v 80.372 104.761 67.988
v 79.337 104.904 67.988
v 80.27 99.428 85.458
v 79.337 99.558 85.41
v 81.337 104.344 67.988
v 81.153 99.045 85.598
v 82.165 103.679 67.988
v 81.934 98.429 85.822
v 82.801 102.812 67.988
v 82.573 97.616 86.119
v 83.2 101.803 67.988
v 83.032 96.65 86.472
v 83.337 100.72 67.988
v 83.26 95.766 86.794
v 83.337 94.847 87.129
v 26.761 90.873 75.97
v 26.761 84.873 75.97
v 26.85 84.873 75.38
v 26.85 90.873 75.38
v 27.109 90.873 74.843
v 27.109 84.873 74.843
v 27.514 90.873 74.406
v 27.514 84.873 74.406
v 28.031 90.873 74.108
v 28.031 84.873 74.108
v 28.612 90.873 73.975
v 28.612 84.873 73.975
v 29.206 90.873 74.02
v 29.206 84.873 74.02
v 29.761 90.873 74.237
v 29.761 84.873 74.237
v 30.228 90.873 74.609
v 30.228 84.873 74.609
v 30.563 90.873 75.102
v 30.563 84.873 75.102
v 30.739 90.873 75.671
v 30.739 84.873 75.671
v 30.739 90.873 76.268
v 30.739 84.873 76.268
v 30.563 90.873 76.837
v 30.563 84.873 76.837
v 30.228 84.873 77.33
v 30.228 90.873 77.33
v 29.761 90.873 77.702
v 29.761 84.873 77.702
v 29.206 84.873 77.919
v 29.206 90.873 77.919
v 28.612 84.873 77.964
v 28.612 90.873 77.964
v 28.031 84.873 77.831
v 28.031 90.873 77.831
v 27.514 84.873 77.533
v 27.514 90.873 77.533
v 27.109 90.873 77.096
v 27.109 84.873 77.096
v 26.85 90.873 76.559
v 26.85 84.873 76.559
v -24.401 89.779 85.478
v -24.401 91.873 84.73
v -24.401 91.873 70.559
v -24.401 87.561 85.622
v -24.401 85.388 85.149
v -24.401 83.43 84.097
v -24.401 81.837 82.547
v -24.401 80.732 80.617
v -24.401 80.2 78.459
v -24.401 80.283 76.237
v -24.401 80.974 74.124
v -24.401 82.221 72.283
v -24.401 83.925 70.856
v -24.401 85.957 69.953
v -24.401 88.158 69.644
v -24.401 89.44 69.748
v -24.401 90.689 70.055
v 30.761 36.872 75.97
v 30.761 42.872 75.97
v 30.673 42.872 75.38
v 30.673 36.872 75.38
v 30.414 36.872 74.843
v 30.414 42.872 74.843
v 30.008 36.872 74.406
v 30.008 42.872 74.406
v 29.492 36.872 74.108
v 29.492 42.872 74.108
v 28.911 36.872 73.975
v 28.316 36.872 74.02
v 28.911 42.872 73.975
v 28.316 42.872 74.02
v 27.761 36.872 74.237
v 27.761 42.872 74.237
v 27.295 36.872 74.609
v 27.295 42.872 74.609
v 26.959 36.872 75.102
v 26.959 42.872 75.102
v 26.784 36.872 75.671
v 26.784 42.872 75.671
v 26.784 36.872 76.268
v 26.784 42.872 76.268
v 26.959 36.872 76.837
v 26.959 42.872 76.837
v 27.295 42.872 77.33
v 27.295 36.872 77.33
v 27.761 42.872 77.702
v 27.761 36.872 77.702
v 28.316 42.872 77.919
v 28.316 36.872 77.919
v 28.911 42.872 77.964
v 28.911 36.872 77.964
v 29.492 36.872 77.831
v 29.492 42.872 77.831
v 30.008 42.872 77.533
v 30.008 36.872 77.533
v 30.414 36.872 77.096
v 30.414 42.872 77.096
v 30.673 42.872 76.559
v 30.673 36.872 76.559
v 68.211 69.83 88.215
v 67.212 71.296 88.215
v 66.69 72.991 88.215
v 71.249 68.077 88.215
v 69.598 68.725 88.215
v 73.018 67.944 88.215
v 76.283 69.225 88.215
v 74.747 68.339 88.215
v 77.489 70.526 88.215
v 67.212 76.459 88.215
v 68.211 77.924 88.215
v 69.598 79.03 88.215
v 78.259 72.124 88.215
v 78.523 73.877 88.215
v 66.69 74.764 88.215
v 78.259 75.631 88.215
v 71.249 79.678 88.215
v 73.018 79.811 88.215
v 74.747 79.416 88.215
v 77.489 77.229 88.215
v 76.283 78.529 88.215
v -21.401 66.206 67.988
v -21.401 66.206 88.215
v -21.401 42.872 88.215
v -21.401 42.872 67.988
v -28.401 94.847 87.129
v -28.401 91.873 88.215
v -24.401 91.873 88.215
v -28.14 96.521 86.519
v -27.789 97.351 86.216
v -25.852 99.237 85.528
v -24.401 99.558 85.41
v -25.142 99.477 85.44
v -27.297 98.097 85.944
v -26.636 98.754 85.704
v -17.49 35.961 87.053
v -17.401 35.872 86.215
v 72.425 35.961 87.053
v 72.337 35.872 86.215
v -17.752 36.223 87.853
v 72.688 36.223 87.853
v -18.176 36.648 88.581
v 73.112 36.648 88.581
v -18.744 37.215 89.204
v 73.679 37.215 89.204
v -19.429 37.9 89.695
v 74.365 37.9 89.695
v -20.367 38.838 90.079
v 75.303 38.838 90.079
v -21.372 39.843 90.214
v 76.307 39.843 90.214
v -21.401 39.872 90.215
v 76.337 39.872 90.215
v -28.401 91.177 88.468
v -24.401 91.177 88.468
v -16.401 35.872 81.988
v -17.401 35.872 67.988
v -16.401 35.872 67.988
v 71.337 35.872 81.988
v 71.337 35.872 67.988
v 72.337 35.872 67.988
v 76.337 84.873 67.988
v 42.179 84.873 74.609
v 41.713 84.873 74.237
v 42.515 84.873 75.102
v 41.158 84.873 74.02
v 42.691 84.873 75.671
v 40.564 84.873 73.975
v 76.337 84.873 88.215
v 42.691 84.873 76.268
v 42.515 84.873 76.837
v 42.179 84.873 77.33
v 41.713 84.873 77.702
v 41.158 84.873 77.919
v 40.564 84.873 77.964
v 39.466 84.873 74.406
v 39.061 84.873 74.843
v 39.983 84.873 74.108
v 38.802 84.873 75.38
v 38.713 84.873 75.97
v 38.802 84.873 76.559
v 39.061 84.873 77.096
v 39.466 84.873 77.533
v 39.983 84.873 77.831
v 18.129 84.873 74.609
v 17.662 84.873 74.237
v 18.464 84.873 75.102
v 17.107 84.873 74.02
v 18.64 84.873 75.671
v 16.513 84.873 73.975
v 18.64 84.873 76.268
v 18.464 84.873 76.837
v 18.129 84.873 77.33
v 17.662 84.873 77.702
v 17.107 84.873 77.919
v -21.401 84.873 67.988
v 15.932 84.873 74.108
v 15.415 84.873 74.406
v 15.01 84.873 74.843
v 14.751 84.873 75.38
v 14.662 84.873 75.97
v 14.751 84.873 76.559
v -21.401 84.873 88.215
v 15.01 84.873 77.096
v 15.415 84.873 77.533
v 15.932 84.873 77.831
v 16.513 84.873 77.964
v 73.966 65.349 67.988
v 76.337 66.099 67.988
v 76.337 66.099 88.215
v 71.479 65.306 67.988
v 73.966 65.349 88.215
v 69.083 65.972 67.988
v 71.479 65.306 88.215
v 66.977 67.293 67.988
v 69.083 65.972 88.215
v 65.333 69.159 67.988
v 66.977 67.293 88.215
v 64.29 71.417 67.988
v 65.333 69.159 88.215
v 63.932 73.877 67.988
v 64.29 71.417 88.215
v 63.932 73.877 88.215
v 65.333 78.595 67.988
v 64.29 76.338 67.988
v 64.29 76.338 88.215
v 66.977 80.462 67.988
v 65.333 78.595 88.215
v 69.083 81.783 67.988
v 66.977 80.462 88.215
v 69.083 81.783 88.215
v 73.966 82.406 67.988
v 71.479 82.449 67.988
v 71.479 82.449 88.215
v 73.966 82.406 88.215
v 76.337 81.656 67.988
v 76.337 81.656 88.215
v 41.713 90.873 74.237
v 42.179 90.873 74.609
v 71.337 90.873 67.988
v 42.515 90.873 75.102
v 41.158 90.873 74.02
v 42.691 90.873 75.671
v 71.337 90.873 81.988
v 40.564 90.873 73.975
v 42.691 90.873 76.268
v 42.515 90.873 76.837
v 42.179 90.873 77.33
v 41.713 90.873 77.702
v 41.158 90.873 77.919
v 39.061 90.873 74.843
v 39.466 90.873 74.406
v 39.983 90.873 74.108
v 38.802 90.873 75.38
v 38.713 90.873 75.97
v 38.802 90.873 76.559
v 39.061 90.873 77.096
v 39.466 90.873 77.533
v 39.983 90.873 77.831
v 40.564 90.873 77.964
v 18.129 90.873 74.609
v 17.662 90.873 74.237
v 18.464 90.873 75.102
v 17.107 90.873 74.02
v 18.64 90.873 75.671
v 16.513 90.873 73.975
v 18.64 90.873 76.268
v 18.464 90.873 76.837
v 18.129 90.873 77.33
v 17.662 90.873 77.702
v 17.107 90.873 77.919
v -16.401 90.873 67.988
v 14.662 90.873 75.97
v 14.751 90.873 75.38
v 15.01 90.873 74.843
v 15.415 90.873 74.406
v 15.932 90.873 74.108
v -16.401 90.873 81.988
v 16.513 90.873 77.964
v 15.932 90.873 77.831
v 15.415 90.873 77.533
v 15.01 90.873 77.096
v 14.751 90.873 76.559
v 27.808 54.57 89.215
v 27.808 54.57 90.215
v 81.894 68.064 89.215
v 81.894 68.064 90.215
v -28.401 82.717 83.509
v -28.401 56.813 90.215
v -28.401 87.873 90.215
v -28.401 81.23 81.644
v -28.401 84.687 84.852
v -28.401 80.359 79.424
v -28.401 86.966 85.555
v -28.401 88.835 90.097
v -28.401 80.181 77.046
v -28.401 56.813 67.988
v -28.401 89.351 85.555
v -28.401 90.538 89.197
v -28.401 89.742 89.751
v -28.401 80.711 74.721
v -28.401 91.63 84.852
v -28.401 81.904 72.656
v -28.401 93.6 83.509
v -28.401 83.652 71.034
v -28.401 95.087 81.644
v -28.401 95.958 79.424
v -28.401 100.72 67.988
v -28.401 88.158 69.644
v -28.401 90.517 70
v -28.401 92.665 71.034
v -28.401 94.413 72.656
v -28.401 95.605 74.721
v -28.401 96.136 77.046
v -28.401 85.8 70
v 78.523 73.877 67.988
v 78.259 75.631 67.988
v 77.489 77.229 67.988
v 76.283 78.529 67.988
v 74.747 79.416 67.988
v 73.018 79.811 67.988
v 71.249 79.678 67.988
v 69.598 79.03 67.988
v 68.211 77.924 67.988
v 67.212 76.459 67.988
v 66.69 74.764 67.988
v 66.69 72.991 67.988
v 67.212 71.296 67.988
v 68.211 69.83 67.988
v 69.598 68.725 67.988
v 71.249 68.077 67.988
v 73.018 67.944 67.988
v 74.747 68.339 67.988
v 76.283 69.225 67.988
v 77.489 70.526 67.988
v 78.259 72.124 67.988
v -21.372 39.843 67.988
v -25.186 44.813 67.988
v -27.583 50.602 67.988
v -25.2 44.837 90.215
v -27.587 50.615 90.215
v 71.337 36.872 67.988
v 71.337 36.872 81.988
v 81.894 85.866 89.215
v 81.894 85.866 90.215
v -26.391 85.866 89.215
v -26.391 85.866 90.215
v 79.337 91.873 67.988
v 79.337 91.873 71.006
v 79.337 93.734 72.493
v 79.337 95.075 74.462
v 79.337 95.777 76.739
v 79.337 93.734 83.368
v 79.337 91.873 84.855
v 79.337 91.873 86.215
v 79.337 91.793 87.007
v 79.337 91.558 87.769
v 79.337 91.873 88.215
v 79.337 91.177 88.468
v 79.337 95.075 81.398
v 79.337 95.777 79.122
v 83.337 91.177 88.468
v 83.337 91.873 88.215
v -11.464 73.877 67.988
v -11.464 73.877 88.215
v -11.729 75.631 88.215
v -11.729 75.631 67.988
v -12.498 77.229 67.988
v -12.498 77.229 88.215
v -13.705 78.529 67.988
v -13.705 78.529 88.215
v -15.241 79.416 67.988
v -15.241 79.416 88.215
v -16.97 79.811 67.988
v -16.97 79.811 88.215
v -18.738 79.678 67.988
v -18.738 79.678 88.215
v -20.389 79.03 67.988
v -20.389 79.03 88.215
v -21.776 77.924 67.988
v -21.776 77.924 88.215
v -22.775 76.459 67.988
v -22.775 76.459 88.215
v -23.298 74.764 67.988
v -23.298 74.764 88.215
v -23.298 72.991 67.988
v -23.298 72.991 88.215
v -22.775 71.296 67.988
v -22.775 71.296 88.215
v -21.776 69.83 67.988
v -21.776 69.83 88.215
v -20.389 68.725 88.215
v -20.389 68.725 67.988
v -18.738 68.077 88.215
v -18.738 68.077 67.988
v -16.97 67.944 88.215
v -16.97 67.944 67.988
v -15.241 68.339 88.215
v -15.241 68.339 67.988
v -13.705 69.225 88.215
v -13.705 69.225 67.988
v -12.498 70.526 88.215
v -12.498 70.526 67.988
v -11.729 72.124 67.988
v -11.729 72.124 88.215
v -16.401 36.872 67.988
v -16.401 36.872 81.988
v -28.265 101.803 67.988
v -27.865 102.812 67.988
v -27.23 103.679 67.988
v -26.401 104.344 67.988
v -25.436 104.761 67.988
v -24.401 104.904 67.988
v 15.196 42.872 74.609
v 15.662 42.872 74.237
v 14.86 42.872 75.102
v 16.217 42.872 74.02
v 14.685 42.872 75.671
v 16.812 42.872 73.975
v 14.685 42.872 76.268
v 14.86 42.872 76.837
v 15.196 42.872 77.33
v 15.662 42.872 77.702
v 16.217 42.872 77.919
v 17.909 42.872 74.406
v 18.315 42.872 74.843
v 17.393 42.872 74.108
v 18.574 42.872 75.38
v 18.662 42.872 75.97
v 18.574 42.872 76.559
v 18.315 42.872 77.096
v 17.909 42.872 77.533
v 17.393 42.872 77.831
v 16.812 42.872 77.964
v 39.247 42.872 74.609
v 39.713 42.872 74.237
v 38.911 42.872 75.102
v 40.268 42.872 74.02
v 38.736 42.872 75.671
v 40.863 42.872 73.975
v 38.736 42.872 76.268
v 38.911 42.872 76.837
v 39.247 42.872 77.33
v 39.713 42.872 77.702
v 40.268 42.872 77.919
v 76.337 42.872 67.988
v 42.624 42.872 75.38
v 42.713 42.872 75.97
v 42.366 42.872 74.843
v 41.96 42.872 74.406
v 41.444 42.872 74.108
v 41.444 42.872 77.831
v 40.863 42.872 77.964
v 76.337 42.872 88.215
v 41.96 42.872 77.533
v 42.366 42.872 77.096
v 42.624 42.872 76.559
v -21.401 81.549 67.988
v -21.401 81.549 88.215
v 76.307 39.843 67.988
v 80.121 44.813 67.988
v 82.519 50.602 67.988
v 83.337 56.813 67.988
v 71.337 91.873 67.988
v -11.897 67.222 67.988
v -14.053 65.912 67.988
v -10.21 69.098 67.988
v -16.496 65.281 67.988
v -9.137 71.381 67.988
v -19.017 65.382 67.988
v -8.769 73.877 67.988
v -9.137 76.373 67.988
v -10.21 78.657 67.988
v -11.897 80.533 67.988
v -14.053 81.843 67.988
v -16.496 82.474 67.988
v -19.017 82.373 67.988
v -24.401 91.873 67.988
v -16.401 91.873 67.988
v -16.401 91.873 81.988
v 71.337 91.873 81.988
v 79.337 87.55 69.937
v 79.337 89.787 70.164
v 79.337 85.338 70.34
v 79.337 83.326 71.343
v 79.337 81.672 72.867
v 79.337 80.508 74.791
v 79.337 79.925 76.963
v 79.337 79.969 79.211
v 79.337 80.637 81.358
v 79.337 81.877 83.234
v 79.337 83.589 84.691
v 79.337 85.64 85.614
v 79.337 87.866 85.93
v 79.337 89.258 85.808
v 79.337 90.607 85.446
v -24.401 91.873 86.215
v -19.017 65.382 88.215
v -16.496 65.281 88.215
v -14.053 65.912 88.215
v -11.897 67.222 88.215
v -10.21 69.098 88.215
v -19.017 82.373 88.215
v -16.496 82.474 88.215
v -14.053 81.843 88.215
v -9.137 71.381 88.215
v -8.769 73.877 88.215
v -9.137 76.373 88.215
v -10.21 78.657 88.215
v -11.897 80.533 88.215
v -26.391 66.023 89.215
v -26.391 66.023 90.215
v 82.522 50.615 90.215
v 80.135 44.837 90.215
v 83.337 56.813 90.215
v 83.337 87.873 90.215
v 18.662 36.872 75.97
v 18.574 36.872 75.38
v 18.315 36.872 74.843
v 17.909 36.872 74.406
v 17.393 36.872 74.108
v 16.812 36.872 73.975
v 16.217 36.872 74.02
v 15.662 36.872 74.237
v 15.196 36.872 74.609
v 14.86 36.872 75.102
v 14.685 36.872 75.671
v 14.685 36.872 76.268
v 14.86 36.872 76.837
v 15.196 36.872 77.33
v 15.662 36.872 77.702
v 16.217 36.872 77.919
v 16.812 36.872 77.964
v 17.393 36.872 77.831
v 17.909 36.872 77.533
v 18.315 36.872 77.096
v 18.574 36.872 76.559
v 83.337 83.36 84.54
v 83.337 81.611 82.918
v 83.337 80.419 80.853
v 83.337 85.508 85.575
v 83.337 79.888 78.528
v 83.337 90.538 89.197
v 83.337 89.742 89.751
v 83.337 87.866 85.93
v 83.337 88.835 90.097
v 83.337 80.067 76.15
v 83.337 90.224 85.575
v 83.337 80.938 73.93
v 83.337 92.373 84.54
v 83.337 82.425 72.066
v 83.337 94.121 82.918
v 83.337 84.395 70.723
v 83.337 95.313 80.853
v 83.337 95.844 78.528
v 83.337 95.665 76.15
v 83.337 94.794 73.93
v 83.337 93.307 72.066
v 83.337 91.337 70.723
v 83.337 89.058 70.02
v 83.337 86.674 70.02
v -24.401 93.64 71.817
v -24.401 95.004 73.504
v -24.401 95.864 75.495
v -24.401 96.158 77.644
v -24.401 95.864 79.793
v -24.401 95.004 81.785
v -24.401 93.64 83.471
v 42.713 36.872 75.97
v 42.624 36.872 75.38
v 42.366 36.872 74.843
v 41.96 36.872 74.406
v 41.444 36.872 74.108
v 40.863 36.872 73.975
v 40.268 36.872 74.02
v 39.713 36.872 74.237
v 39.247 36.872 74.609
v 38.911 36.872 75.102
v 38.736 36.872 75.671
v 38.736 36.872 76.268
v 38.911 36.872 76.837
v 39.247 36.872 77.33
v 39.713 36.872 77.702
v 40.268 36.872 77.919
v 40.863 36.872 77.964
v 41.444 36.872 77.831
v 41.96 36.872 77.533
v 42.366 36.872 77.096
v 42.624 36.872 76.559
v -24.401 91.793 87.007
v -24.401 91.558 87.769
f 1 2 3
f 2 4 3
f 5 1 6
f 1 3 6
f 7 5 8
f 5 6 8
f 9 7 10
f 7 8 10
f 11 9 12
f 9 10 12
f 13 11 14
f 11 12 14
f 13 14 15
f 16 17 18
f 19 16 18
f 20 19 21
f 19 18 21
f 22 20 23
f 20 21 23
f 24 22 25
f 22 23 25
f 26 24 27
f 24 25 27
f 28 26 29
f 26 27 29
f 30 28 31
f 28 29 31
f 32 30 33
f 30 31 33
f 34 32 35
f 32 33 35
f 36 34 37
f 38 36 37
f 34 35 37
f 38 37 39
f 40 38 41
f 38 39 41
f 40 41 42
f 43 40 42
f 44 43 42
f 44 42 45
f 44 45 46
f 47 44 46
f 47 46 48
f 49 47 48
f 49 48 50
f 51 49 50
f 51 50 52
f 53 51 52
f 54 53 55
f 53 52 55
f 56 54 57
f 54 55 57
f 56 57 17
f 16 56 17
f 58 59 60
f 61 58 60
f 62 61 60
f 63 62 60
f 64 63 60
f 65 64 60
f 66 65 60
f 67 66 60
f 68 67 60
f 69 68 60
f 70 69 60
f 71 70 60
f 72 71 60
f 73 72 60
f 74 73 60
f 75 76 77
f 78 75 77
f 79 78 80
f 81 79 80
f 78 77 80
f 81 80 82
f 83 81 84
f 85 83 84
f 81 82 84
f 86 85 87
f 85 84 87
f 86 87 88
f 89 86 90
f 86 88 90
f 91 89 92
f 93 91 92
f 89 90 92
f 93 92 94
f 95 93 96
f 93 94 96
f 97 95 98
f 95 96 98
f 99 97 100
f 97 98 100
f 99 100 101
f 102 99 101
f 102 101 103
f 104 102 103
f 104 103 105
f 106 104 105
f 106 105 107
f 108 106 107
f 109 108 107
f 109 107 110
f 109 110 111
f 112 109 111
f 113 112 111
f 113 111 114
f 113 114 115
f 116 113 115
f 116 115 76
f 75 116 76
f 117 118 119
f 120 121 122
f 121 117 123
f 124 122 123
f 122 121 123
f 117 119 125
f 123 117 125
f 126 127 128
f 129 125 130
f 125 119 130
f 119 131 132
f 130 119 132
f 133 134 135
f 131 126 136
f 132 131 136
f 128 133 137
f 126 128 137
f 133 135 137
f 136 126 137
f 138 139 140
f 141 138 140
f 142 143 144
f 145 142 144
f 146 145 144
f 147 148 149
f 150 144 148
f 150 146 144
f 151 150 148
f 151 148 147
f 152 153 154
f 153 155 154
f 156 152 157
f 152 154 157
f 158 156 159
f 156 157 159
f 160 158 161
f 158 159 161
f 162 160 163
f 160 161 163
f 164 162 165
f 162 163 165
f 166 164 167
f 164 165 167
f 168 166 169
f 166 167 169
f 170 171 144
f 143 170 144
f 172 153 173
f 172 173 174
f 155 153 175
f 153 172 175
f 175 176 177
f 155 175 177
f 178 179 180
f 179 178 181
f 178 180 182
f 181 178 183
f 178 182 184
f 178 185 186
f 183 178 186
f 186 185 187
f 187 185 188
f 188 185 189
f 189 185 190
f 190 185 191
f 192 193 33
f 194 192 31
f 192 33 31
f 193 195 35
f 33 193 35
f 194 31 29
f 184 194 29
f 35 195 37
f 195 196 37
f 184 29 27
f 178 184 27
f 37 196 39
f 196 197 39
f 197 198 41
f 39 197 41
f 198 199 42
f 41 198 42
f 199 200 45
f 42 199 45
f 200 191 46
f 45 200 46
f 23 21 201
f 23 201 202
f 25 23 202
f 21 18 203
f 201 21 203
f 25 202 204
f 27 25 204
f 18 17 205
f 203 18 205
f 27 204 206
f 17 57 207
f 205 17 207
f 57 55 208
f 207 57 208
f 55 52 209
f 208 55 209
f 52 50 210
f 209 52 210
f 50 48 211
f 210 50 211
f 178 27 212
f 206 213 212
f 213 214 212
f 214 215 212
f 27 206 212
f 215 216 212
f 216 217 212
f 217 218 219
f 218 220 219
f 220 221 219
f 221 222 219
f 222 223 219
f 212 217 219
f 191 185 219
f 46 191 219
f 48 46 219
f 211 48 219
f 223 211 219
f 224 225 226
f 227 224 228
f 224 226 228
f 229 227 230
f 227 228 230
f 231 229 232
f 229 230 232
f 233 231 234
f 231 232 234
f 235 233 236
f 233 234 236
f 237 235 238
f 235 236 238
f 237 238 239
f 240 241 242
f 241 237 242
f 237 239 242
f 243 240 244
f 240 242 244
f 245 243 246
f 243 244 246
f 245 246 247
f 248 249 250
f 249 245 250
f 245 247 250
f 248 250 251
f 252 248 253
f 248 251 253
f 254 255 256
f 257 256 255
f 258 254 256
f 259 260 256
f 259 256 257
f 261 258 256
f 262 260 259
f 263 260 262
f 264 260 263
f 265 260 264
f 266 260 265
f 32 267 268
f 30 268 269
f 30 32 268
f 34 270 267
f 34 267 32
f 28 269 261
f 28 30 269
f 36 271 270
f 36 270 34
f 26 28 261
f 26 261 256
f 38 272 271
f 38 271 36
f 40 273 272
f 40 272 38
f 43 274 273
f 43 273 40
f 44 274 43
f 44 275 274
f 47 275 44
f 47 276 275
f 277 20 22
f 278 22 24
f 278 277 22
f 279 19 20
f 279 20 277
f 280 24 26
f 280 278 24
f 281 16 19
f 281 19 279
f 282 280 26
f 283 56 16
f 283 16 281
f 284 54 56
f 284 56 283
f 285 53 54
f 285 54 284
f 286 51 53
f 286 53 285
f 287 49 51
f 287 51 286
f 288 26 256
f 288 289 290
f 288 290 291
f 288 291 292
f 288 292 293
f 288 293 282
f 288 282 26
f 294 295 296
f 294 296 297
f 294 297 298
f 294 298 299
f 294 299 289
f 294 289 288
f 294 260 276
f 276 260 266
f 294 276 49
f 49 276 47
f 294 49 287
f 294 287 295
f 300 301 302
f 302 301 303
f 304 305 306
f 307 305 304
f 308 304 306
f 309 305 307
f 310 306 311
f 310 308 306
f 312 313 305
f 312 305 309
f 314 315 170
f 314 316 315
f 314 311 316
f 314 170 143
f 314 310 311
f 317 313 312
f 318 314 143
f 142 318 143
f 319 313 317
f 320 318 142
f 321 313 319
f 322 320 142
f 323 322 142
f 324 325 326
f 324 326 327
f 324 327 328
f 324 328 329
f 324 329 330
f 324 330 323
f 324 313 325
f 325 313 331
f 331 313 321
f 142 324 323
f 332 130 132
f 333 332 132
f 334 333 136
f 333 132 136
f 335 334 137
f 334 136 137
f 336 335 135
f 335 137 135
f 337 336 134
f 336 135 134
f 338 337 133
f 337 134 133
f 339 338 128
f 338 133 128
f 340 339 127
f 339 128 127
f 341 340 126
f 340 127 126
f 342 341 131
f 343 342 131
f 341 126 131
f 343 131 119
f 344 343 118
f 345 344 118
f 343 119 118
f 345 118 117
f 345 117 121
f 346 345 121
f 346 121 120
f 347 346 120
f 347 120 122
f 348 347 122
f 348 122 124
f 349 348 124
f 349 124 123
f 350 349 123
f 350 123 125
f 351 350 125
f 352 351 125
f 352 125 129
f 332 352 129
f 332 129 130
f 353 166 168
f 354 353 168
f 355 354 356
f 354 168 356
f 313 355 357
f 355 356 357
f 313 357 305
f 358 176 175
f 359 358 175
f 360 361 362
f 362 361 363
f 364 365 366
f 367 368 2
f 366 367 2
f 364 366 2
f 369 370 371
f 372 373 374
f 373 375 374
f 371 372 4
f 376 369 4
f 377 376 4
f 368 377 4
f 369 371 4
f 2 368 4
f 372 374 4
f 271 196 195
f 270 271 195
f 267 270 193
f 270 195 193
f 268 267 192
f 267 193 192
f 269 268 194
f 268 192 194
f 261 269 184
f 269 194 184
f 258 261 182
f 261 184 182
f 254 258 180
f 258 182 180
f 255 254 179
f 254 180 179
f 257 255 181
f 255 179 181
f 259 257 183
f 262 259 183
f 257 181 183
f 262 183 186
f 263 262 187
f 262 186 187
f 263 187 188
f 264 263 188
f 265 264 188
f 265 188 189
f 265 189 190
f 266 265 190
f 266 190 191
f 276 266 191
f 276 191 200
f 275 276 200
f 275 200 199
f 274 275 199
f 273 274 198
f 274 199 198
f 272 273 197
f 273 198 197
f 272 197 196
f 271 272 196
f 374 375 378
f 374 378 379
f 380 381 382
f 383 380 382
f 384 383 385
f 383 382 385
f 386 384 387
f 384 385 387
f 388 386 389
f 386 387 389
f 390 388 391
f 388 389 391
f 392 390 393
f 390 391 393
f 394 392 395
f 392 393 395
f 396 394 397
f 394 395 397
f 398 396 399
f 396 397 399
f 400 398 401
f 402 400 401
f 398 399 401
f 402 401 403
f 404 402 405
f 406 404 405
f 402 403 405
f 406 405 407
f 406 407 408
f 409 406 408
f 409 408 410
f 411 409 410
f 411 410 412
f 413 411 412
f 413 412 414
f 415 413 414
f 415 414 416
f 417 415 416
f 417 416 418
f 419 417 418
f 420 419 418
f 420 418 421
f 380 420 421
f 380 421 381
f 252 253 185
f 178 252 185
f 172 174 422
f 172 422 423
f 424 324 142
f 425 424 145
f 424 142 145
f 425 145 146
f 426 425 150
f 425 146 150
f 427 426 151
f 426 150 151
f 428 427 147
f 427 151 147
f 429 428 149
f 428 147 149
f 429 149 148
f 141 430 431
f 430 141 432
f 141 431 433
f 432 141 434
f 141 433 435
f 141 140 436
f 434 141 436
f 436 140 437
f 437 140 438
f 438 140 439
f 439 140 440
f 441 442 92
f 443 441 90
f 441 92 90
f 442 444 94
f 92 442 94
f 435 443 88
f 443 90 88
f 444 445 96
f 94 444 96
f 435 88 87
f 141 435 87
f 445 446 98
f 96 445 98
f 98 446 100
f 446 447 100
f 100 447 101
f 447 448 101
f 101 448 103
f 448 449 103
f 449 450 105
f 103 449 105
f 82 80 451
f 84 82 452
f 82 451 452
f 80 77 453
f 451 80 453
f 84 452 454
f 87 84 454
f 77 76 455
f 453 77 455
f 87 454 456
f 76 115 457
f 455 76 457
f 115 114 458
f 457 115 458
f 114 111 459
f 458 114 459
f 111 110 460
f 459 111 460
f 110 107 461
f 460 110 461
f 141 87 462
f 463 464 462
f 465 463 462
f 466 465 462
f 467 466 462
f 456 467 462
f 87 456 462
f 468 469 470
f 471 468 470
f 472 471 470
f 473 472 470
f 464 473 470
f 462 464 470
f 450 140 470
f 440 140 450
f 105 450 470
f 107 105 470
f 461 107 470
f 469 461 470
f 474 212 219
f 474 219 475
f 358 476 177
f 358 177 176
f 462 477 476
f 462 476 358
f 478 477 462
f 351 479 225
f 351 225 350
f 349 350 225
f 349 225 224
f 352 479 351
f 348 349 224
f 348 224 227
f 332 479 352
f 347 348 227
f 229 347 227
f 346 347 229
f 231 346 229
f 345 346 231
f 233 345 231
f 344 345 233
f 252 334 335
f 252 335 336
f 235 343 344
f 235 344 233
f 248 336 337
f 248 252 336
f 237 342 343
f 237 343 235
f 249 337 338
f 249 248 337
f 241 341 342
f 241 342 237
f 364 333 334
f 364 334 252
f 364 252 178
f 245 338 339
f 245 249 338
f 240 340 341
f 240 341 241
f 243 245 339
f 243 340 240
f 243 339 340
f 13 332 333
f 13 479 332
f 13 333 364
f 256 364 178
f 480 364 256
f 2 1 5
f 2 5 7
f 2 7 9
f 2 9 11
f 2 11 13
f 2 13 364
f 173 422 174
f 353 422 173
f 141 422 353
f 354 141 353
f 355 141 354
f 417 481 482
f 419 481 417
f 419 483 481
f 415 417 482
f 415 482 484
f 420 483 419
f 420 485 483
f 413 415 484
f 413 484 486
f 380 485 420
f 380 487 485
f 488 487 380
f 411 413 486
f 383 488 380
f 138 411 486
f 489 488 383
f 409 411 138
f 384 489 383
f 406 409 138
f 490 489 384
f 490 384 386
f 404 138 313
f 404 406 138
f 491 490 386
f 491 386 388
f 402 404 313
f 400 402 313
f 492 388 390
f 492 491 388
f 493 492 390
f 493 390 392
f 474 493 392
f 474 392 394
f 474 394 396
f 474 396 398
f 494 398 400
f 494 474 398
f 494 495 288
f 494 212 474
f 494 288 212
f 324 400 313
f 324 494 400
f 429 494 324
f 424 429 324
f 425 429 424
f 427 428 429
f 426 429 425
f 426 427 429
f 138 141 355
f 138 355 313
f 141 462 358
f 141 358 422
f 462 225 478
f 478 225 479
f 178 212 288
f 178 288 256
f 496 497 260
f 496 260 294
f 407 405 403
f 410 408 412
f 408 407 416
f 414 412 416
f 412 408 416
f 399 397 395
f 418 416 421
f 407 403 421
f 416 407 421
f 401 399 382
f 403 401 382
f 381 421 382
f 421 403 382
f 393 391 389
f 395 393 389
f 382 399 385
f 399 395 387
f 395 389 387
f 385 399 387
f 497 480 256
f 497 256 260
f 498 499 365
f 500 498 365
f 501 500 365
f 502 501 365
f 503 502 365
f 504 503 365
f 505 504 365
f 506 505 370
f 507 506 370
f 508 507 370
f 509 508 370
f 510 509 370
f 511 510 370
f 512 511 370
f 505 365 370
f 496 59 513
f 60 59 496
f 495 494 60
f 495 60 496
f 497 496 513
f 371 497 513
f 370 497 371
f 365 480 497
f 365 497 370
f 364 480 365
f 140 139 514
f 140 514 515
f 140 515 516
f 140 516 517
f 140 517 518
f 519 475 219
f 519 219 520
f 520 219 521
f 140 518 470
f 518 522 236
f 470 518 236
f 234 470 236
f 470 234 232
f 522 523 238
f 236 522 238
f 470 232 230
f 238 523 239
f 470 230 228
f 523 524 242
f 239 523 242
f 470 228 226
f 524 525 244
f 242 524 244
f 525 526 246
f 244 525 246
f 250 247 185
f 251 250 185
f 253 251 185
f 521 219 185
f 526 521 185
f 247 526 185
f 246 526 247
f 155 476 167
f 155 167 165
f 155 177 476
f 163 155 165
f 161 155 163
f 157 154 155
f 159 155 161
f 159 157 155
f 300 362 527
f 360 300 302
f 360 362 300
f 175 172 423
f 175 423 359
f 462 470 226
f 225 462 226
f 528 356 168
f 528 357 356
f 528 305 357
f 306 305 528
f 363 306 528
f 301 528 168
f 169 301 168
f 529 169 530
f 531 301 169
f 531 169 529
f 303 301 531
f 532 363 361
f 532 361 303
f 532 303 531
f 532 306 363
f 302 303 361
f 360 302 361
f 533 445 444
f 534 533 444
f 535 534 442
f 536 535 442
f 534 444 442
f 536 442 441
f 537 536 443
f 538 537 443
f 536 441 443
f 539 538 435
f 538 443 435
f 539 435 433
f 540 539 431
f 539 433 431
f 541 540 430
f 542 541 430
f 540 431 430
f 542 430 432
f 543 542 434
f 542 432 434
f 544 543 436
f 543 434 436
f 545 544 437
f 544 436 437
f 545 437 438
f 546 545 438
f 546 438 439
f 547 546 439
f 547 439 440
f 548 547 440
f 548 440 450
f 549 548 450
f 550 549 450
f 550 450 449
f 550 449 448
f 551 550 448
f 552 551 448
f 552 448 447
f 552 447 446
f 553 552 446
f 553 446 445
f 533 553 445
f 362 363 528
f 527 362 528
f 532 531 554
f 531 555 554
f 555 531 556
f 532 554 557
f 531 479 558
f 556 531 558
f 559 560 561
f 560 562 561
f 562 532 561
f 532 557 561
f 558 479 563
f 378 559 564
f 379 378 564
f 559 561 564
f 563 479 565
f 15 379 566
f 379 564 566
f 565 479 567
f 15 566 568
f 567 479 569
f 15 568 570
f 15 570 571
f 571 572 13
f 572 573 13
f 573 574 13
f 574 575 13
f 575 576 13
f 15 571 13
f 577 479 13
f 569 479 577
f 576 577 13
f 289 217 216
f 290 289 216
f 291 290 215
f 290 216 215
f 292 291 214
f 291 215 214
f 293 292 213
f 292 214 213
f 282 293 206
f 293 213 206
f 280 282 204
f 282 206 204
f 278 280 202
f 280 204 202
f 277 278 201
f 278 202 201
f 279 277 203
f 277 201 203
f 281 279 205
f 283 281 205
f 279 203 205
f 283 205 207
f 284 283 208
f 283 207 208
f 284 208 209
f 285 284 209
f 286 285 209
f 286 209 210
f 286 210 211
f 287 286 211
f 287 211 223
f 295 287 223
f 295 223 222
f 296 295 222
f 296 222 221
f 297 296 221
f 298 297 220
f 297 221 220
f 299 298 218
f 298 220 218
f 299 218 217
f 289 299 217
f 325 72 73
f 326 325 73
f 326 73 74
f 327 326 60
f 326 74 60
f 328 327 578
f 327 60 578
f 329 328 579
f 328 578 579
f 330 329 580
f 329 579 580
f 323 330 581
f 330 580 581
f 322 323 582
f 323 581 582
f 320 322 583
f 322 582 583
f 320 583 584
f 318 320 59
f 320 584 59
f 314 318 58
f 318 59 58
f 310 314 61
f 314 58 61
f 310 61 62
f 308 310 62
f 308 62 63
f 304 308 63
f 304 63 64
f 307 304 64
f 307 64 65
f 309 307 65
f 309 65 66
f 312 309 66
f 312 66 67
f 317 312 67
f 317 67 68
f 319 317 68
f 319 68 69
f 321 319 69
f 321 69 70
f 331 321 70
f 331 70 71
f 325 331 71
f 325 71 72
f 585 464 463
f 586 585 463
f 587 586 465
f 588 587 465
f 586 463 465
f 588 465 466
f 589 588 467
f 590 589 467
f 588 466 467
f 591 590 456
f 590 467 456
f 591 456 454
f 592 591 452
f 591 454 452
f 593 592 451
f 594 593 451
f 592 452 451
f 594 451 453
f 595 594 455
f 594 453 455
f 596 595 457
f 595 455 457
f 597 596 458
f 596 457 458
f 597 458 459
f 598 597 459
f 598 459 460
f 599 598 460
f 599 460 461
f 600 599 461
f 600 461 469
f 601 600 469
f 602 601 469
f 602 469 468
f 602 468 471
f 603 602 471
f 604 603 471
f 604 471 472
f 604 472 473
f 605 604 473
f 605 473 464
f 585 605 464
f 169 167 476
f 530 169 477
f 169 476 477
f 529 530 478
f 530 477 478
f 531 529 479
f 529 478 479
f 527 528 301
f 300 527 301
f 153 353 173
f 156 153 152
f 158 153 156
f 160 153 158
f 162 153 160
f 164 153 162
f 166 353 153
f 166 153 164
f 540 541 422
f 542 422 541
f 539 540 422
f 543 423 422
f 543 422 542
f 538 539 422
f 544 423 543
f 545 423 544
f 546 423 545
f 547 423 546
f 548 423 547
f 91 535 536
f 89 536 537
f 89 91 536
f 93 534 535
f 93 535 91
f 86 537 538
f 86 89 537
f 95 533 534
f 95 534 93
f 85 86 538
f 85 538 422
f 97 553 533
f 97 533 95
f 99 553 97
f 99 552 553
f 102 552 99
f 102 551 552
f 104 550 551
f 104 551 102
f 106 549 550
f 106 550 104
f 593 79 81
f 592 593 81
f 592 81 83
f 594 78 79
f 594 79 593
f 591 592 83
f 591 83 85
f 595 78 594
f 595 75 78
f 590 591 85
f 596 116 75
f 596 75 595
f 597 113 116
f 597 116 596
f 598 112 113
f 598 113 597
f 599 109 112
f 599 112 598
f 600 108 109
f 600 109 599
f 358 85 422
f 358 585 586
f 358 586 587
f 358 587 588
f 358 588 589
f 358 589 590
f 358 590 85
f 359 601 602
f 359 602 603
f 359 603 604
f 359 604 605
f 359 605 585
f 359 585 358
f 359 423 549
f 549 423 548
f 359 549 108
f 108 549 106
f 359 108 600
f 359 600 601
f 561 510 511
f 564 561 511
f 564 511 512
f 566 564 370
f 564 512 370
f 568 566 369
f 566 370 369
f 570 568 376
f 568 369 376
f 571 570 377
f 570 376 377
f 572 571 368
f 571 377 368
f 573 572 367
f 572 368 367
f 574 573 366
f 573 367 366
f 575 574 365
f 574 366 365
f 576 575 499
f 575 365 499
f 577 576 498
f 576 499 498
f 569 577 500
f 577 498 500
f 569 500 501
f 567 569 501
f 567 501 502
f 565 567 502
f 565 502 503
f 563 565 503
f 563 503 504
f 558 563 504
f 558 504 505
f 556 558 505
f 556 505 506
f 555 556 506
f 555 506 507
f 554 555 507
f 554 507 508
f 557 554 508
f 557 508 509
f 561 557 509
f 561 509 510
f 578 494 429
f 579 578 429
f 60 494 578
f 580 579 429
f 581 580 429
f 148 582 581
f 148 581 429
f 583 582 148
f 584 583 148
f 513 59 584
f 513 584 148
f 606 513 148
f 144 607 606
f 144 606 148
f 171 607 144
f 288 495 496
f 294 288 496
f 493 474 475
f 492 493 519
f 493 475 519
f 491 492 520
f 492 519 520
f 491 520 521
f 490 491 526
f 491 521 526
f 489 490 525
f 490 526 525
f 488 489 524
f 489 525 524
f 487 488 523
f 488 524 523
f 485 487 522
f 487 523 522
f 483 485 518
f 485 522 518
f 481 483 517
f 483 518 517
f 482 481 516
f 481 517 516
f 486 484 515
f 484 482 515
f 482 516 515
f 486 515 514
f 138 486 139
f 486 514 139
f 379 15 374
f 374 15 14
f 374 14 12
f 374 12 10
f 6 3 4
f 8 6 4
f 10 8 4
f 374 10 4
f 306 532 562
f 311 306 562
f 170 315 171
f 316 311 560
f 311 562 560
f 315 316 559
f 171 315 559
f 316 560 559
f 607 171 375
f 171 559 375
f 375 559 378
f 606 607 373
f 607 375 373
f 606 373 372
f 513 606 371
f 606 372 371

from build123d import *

# Parameters (mm, degrees)
SKETCH4_W                      = 111.737645783
SKETCH4_H                      = 62.825705526
BOSS_EXTRUDE3_DEPTH            = 20.22630919
SKETCH5_W                      = 103.737645783
SKETCH5_H                      = 6.825139403
CUT_EXTRUDE1_DEPTH             = 131.749158903
CUT_EXTRUDE2_DEPTH             = 131.749158903
SKETCH7_W                      = 87.737645783
SKETCH7_H                      = 14
CUT_EXTRUDE3_DEPTH             = 1
SKETCH8_W                      = 87.737645783
SKETCH8_H                      = 14
CUT_EXTRUDE4_DEPTH             = 1
DRAFT1_ANGLE                   = 17.058179216
F_16_0_16_DIAMETER_HOLE1_D     = 16
F_16_0_16_DIAMETER_HOLE1_DEPTH = 4
F_16_0_16_DIAMETER_HOLE2_D     = 16
F_16_0_16_DIAMETER_HOLE2_DEPTH = 4
F_4_0_4_DIAMETER_HOLE1_D       = 4
F_4_0_4_DIAMETER_HOLE1_DEPTH   = 6
F_4_0_4_DIAMETER_HOLE2_D       = 4
F_4_0_4_DIAMETER_HOLE2_DEPTH   = 68.031973705
M10_CLEARANCE_HOLE1_D          = 11.9
CHAMFER1_SIZE                  = 6.825139403
CHAMFER1_SIZE2                 = 2.933140798
CHAMFER2_SIZE                  = 6.825139403
CHAMFER2_SIZE2                 = 2.933140798
SKETCH19_W                     = 111.737645783
SKETCH19_H                     = 56.000566123
BOSS_EXTRUDE4_DEPTH            = 2
FILLET7_R                      = 4
CHAMFER3_SIZE                  = 11
CHAMFER4_SIZE                  = 11
FILLET9_R                      = 24
FILLET10_R                     = 24
CUT_EXTRUDE6_DEPTH             = 1
FILLET13_R                     = 4
FILLET14_R                     = 4
FILLET15_R                     = 4


# Some blends are built 0.0001 mm under size
with BuildPart() as part:
    # Sketch4 → Boss-Extrude3 (new body)
    with BuildSketch(Plane(origin=(0, 0, 67.988216463), x_dir=(-1, 0, 0), z_dir=(0, 0, -1))):
        with Locations((-27.467757585, 67.284935079)):
            Rectangle(SKETCH4_W, SKETCH4_H)
    extrude(amount=-BOSS_EXTRUDE3_DEPTH)

    # Sketch5 → Cut-Extrude1 (cut, through all)
    with BuildSketch(Plane.XY.offset(88.214525653)):
        with Locations((27.467757585, 95.285218141)):
            Rectangle(SKETCH5_W, SKETCH5_H)
    extrude(amount=-CUT_EXTRUDE1_DEPTH, mode=Mode.SUBTRACT)

    # Sketch6 → Cut-Extrude2 (cut, through all)
    with BuildSketch(Plane.XY.offset(88.214525653)):
        with BuildLine():
            Line((-21.401065306, 66.205832154), (-21.401065306, 42.872082316))
            Line((-21.401065306, 42.872082316), (76.336580477, 42.872082316))
            Line((76.336580477, 42.872082316), (76.336580477, 66.098543331))
            ThreePointArc((76.336580477, 66.098543331), (63.931745492, 73.877367201), (76.336580477, 81.65619107))
            Line((76.336580477, 81.65619107), (76.336580477, 84.872648439))
            Line((76.336580477, 84.872648439), (-21.401065306, 84.872648439))
            Line((-21.401065306, 84.872648439), (-21.401065306, 81.548902247))
            ThreePointArc((-21.401065306, 81.548902247), (-8.768867408, 73.877367201), (-21.401065306, 66.205832154))
        make_face()
    extrude(amount=-CUT_EXTRUDE2_DEPTH, mode=Mode.SUBTRACT)

    # Sketch7 → Cut-Extrude3 (cut)
    with BuildSketch(Plane(origin=(0, 91.872648439, 0), x_dir=(-1, 0, 0), z_dir=(0, 1, 0))):
        with Locations((-27.467757585, 74.988216463)):
            Rectangle(SKETCH7_W, SKETCH7_H)
    extrude(amount=-CUT_EXTRUDE3_DEPTH, mode=Mode.SUBTRACT)

    # Sketch8 → Cut-Extrude4 (cut)
    with BuildSketch(Plane.XZ.offset(-35.872082316)):
        with Locations((27.467757585, 74.988216463)):
            Rectangle(SKETCH8_W, SKETCH8_H)
    extrude(amount=-CUT_EXTRUDE4_DEPTH, mode=Mode.SUBTRACT)

    # Draft1
    draft1_faces = [part.faces().sort_by_distance(p)[0] for p in [
        (-26.401065306, 98.697787842, 78.101371058),
        (81.336580477, 98.697787842, 78.101371058),
    ]]
    draft(draft1_faces, Plane.XY.offset(88.214525653), DRAFT1_ANGLE)

    # Ø16.0 (16) Diameter Hole1
    with Locations(Plane.ZY.offset(28.401065306)):
        with Locations((77.644129293, 88.158482369)):
            Hole(F_16_0_16_DIAMETER_HOLE1_D / 2, depth=F_16_0_16_DIAMETER_HOLE1_DEPTH)

    # Ø16.0 (16) Diameter Hole2
    with Locations(Plane(origin=(83.336580477, 0, 0), x_dir=(0, 0, -1), z_dir=(1, 0, 0))):
        with Locations((-77.930295014, 87.866076089)):
            Hole(F_16_0_16_DIAMETER_HOLE2_D / 2, depth=F_16_0_16_DIAMETER_HOLE2_DEPTH)

    # Ø4.0 (4) Diameter Hole1
    with Locations(Plane(origin=(0, 90.872648439, 0), x_dir=(1, 0, 0), z_dir=(0, 1, 0))):
        with Locations((40.713339239, -75.969517026), (28.761431707, -75.969517026), (16.662423773, -75.969517026)):
            Hole(F_4_0_4_DIAMETER_HOLE1_D / 2, depth=F_4_0_4_DIAMETER_HOLE1_DEPTH)

    # Ø4.0 (4) Diameter Hole2
    with Locations(Plane(origin=(0, 36.872082316, 0), x_dir=(-1, 0, 0), z_dir=(0, -1, 0))):
        with Locations((-40.713339239, -75.969517026), (-28.761431707, -75.969517026), (-16.662423773, -75.969517026)):
            Hole(F_4_0_4_DIAMETER_HOLE2_D / 2, depth=F_4_0_4_DIAMETER_HOLE2_DEPTH)

    # M10 Clearance Hole1 (through all)
    with Locations(Plane(origin=(0, 0, 67.988216463), x_dir=(-1, 0, 0), z_dir=(0, 0, -1))):
        with Locations((-72.573135404, 73.877367201), (17.414428357, 73.877367201)):
            Hole(M10_CLEARANCE_HOLE1_D / 2)

    # Chamfer1
    chamfer1_edges = [part.edges().sort_by_distance(p)[0] for p in [
        (81.336580477, 98.697787842, 88.214525653),
    ]]
    chamfer1_side = [part.faces().sort_by_distance(p)[0] for p in [
        (27.467757585, 37.153970406, 88.214525653),
    ]]
    chamfer(chamfer1_edges, length=CHAMFER1_SIZE, length2=CHAMFER1_SIZE2, reference=chamfer1_side[0])

    # Chamfer2
    chamfer2_edges = [part.edges().sort_by_distance(p)[0] for p in [
        (-26.401065306, 98.697787842, 88.214525653),
    ]]
    chamfer2_side = [part.faces().sort_by_distance(p)[0] for p in [
        (82.054692387, 63.872365377, 88.214525653),
    ]]
    chamfer(chamfer2_edges, length=CHAMFER2_SIZE, length2=CHAMFER2_SIZE2, reference=chamfer2_side[0])

    # Sketch19 → Boss-Extrude4 (add)
    with BuildSketch(Plane.XY.offset(88.214525653)):
        with Locations((27.467757585, 63.872365378)):
            Rectangle(SKETCH19_W, SKETCH19_H)
    extrude(amount=BOSS_EXTRUDE4_DEPTH)

    # Fillet7
    # the kernel refuses this fillet: 4 mm, written as the material it takes off along each edge
    with BuildSketch(Plane(origin=(93.336580477, 91.872648439, 90.214525653), x_dir=(0, 0, -1), z_dir=(-1, 0, 0))) as fillet7_piece_1_section:
        with BuildLine():
            CenterArc((FILLET7_R, FILLET7_R), FILLET7_R, 180, 90)
            Line((0, FILLET7_R), (0, 0))
            Line((0, 0), (FILLET7_R, 0))
        make_face()
    fillet7_piece_1 = extrude(amount=131.737645784, mode=Mode.PRIVATE)
    fillet7_piece_1 = split(fillet7_piece_1, bisect_by=Plane(origin=(81.336580477, 90.577181296, 88.687181842), z_dir=(0, 0.34275303765814863, 0.9394255453074032)), keep=Keep.TOP, mode=Mode.PRIVATE)
    add(fillet7_piece_1, mode=Mode.SUBTRACT)
    with BuildSketch(Plane(origin=(93.336580477, 91.872648439, 90.214525653), x_dir=(0, 0, -1), z_dir=(-1, 0, 0))) as fillet7_piece_2_section:
        with BuildLine():
            CenterArc((FILLET7_R, FILLET7_R), FILLET7_R, 180, 90)
            Line((0, FILLET7_R), (0, 0))
            Line((0, 0), (FILLET7_R, 0))
        make_face()
    fillet7_piece_2 = extrude(amount=131.737645784, mode=Mode.PRIVATE)
    fillet7_piece_2 = split(fillet7_piece_2, bisect_by=Plane(origin=(-24.401065306, 91.673256094, 87.815354023), z_dir=(1, 0, 0)), keep=Keep.TOP, mode=Mode.PRIVATE)
    fillet7_piece_2 = split(fillet7_piece_2, bisect_by=Plane(origin=(79.336580477, 91.673256094, 87.815354023), z_dir=(-1, 0, 0)), keep=Keep.TOP, mode=Mode.PRIVATE)
    add(fillet7_piece_2, mode=Mode.SUBTRACT)

    # Chamfer3
    chamfer3_edges = [part.edges().sort_by_distance(p)[0] for p in [
        (83.336580477, 35.872082316, 79.101371058),
    ]]
    chamfer(chamfer3_edges, length=CHAMFER3_SIZE)

    # Chamfer4
    chamfer4_edges = [part.edges().sort_by_distance(p)[0] for p in [
        (-28.401065306, 35.872082316, 79.101371058),
    ]]
    chamfer(chamfer4_edges, length=CHAMFER4_SIZE)

    # Fillet9
    fillet9_edges = [part.edges().sort_by_distance(p)[0] for p in [
        (83.336580477, 46.872082316, 79.101371058),
    ]]
    fillet(fillet9_edges, radius=FILLET9_R)

    # Fillet10
    fillet10_edges = [part.edges().sort_by_distance(p)[0] for p in [
        (-28.401065306, 46.872082316, 79.101371058),
    ]]
    fillet(fillet10_edges, radius=FILLET10_R)

    # Sketch21 → Cut-Extrude6 (cut)
    with BuildSketch(Plane.XY.offset(90.214525653)):
        Polygon((-26.391485045, 85.865514682), (-26.391485045, 66.022635818), (27.807921223, 54.570460017), (81.893939612, 68.063617644), (81.893939612, 85.865514682), align=None)
    extrude(amount=-CUT_EXTRUDE6_DEPTH, mode=Mode.SUBTRACT)

    # Fillet13
    fillet13_edges = [part.edges().sort_by_distance(p)[0] for p in [
        (-28.401065306, 102.231129511, 76.699318929),
    ]]
    fillet(fillet13_edges, radius=FILLET13_R - 0.0001)  # a hair under: the kernel refuses the full size

    # Fillet14
    fillet14_edges = [part.edges().sort_by_distance(p)[0] for p in [
        (83.336580477, 102.231129511, 76.699318929),
    ]]
    fillet(fillet14_edges, radius=FILLET14_R - 0.0001)  # a hair under: the kernel refuses the full size

    # Fillet15
    fillet15_edges = [part.edges().sort_by_distance(p)[0] for p in [
        (27.467757585, 35.872082316, 90.214525653),
    ]]
    fillet(fillet15_edges, radius=FILLET15_R)


solid = part.part
